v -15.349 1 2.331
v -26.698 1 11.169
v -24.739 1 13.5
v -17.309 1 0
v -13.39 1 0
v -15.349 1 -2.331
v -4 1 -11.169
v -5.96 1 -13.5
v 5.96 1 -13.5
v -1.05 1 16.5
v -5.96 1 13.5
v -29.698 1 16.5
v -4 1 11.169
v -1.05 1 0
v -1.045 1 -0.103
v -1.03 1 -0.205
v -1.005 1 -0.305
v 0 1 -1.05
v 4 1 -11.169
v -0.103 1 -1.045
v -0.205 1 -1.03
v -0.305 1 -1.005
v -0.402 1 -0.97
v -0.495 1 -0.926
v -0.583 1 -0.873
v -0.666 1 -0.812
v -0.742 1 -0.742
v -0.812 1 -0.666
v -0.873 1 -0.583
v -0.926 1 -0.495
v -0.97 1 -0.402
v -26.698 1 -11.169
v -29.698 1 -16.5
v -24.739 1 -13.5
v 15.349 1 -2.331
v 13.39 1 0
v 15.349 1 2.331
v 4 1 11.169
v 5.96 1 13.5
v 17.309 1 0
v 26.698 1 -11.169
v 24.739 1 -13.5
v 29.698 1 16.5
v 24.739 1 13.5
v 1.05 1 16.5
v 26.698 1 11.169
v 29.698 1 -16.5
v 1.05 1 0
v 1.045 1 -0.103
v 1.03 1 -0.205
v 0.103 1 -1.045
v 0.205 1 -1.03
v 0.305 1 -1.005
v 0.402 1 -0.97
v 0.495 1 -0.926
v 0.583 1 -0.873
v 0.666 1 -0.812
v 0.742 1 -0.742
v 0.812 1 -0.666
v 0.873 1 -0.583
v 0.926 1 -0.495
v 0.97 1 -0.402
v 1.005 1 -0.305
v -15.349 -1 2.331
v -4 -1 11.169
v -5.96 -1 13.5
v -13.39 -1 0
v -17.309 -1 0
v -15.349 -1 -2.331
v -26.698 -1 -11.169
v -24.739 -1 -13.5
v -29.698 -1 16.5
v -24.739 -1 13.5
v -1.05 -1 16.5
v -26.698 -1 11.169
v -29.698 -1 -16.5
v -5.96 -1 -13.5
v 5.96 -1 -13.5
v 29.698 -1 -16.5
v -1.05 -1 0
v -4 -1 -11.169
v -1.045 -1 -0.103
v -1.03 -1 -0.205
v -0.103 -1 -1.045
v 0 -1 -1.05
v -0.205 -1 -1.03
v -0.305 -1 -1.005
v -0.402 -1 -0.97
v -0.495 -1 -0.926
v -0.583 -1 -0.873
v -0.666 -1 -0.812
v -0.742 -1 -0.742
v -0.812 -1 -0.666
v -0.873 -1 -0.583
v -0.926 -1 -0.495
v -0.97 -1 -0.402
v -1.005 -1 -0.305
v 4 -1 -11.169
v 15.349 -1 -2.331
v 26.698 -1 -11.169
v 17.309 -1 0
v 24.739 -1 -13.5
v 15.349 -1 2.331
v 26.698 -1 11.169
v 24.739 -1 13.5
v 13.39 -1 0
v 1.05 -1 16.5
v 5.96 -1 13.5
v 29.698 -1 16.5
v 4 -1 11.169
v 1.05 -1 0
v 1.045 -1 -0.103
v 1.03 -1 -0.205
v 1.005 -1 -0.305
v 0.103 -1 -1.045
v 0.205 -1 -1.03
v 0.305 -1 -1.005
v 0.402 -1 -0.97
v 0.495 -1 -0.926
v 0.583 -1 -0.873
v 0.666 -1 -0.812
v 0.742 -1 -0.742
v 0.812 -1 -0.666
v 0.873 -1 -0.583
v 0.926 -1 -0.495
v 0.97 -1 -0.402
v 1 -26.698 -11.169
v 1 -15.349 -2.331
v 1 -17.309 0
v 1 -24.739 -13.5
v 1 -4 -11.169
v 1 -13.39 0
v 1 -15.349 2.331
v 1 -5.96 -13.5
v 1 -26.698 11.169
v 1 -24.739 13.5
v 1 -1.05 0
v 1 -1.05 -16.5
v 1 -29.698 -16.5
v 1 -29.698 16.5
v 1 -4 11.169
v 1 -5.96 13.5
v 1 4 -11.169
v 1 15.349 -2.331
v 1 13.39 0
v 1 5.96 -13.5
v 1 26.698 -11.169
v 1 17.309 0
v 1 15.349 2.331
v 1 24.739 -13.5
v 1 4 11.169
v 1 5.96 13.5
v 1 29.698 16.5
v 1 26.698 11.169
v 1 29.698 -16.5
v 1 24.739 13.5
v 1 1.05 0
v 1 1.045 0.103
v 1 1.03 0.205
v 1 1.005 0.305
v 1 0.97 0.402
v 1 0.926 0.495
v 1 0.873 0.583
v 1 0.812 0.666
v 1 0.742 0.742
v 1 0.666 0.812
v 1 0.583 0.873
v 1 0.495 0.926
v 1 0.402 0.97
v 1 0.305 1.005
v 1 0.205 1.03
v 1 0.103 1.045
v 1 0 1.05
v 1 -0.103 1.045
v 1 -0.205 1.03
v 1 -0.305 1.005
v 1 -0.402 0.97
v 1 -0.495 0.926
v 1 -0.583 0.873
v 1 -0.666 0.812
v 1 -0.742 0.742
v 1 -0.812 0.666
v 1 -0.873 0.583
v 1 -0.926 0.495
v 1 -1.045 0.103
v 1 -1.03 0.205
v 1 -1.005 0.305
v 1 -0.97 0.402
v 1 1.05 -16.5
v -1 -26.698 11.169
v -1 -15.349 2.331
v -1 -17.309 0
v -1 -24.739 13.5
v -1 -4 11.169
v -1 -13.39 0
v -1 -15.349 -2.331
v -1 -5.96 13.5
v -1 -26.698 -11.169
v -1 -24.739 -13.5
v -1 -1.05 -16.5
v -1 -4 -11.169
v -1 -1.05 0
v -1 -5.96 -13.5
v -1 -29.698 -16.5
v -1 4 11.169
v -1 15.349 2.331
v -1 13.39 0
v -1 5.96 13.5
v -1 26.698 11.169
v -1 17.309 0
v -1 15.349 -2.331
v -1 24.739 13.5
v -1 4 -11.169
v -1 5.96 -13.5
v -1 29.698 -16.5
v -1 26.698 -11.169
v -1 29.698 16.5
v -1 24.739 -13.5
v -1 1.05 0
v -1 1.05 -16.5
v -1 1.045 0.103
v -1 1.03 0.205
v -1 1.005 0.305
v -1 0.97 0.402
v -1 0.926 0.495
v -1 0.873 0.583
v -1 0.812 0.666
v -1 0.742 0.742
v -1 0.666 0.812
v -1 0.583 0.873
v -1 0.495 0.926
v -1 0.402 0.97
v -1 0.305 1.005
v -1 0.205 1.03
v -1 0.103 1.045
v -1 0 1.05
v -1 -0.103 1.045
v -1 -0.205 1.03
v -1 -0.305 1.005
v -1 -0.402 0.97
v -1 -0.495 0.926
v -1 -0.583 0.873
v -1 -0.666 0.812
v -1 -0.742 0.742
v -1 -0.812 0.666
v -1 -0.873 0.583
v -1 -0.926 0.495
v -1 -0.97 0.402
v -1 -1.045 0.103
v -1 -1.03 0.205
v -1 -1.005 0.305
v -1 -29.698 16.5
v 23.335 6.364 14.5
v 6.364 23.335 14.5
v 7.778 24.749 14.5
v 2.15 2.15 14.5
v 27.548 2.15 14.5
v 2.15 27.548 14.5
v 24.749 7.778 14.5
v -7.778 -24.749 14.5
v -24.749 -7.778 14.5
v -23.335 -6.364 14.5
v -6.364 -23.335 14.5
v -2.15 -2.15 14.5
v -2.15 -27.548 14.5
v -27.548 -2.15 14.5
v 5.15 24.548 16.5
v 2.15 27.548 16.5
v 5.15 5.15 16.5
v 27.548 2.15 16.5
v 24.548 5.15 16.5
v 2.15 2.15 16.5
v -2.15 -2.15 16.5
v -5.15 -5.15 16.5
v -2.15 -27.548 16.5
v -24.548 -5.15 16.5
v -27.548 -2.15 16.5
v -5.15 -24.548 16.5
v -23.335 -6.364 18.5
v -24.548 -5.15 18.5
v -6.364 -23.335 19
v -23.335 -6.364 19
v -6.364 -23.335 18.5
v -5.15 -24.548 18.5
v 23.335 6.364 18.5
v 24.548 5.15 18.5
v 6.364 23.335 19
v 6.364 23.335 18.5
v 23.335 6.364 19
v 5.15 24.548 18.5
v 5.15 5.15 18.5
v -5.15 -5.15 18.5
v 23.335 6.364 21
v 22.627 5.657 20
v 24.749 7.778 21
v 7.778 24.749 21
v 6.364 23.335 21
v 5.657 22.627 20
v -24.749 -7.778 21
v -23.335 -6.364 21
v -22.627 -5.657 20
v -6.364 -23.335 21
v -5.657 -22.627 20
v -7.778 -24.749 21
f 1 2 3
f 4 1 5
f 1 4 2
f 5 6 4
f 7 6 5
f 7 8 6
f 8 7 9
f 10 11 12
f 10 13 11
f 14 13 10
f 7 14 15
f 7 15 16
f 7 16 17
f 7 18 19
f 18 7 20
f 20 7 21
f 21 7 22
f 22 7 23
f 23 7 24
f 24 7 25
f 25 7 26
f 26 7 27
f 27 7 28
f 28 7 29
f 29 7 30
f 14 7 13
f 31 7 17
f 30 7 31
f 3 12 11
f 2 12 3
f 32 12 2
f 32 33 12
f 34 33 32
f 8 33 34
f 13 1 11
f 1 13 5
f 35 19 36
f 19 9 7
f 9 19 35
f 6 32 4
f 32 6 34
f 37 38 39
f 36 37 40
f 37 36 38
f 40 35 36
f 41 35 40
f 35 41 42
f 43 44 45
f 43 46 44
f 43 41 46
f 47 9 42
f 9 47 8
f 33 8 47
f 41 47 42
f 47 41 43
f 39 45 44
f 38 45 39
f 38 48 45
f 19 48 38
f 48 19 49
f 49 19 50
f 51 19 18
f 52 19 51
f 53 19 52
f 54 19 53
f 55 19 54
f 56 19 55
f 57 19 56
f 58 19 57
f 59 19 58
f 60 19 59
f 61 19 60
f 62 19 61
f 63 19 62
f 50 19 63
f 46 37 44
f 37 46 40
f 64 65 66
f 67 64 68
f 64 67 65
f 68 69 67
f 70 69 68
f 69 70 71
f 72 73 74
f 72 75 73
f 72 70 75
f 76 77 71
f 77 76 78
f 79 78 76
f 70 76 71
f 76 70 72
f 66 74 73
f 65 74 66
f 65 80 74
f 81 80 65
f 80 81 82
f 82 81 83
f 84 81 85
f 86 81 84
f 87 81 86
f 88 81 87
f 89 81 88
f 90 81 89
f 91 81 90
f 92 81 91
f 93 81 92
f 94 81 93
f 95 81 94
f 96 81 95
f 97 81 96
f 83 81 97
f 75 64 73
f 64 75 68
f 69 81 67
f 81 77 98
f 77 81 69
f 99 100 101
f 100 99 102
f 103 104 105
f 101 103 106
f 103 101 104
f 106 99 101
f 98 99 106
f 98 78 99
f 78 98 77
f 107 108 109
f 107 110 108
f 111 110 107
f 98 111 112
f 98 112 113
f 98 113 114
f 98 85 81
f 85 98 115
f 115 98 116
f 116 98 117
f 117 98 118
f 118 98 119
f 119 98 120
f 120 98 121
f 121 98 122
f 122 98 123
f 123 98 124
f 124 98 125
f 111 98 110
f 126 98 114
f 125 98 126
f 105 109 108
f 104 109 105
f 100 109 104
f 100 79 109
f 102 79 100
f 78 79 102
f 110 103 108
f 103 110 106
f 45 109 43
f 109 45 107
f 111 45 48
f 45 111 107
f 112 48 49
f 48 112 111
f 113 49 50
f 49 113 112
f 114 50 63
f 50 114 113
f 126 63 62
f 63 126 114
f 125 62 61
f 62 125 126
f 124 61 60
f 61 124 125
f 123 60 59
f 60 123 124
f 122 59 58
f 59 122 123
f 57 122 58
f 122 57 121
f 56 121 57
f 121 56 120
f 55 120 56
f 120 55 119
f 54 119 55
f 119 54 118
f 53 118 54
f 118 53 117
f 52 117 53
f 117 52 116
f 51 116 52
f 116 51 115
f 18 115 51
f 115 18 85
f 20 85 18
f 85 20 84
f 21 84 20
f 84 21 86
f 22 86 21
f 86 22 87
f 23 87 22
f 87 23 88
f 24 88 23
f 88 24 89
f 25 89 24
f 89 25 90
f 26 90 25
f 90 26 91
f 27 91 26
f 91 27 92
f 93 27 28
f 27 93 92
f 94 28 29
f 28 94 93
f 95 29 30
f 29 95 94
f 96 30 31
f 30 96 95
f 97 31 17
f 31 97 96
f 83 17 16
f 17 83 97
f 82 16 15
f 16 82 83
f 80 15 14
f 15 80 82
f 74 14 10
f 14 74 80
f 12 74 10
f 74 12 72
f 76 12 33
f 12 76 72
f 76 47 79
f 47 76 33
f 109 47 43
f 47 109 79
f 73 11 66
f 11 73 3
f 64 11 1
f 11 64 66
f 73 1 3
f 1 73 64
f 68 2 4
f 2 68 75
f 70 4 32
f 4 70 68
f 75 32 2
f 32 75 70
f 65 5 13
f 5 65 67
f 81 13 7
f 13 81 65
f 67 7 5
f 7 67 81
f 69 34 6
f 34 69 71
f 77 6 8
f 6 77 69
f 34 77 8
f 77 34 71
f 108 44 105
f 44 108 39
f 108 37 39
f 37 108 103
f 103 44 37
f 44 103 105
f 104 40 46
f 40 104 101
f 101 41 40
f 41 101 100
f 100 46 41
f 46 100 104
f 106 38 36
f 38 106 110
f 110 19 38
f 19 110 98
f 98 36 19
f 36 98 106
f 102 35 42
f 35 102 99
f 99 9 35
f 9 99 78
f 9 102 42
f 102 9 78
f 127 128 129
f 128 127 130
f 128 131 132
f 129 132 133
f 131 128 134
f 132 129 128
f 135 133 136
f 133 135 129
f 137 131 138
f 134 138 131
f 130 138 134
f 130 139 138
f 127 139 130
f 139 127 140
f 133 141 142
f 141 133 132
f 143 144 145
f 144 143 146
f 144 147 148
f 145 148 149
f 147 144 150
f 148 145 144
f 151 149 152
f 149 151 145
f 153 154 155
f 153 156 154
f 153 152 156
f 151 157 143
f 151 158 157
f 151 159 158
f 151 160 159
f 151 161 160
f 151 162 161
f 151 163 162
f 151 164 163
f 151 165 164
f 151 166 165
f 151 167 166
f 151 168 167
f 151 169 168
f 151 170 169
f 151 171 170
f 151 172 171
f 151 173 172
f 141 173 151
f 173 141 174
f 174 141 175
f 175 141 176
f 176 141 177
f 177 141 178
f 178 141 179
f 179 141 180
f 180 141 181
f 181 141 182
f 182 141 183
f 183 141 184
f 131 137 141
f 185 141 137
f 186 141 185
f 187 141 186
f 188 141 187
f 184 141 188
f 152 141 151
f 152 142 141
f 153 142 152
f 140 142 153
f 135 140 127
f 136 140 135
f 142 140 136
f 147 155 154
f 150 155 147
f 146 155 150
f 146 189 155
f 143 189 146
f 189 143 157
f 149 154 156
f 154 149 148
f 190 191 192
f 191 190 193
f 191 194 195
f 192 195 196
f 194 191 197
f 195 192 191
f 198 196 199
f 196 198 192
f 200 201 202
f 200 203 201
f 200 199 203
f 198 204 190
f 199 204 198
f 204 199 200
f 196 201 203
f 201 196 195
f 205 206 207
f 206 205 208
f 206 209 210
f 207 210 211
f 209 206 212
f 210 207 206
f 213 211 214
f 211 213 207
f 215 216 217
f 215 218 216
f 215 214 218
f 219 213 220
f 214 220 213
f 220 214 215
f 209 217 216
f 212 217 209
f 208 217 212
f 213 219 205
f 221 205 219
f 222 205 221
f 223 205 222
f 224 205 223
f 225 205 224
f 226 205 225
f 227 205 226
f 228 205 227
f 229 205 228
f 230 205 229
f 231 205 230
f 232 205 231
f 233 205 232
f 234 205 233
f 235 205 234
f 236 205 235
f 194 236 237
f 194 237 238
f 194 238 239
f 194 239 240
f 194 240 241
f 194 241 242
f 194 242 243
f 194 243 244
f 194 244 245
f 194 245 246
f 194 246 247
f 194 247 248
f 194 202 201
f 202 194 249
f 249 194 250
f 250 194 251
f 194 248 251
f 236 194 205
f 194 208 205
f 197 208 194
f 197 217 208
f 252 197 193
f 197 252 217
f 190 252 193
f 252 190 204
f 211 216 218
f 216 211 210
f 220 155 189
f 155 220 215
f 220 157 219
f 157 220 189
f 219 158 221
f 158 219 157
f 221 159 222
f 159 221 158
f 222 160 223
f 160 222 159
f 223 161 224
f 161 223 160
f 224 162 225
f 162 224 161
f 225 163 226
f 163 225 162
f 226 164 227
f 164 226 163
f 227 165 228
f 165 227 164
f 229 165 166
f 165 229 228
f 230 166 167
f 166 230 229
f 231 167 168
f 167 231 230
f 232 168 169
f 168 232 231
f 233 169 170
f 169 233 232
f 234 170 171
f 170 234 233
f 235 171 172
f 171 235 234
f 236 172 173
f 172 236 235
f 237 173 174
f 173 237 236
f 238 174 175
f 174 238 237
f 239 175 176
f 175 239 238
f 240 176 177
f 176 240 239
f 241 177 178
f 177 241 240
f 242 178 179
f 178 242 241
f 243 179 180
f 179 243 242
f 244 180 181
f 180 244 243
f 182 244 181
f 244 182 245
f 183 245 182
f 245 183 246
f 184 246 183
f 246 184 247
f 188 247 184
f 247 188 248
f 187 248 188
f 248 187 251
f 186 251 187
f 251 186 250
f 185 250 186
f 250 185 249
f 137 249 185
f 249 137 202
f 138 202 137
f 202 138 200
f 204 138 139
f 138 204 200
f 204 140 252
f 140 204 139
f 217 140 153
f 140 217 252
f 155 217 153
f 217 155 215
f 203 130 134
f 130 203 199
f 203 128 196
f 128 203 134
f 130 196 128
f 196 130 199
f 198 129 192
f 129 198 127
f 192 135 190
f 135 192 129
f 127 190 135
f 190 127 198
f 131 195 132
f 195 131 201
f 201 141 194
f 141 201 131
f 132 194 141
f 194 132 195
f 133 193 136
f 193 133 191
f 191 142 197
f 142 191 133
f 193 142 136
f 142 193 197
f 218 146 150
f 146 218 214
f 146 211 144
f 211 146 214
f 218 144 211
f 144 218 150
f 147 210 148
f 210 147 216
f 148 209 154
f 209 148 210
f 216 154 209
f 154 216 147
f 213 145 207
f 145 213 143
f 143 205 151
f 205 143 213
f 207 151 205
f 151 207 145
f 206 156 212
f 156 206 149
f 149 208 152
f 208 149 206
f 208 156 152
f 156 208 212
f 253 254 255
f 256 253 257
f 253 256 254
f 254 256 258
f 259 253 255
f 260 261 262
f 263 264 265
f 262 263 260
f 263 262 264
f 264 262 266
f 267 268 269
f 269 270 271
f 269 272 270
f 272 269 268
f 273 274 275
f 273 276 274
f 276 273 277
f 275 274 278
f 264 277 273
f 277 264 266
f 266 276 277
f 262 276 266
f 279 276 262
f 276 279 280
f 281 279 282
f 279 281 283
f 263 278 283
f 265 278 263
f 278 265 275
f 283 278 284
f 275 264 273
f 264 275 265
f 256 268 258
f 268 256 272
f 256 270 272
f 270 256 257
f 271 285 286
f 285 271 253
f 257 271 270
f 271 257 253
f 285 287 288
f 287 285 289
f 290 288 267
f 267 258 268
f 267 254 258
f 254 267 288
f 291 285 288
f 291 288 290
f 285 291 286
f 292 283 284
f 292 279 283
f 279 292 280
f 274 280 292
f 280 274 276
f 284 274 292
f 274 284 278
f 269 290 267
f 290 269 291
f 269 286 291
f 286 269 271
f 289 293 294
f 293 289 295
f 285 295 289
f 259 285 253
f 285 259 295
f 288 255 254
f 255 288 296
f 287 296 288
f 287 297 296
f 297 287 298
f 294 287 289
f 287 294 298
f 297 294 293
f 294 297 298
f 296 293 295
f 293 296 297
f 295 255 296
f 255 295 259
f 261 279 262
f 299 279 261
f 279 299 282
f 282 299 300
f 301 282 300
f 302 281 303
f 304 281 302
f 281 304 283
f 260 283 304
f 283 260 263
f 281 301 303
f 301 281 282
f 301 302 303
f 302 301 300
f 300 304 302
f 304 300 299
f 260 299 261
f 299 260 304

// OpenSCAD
$fn = $preview? 16: 64;

stage_height = 35;
stage_width = 42;
stage_length = stage_width;
stage_thickness = 2;
stage_leg_socket_height = 5;
stage_leg_socket_thickness = 1;
stage_flange_height = 2;
leg_height = stage_height - stage_thickness;
leg_width = sqrt(stage_width ^ 2 + stage_length ^ 2);
leg_thickness = 2;
leg_frame_width = 3;
leg_brace_width = 3;
center_hole_length = 2;
rail_fence_height = 2;
rail_fence_radius = 1;

module leg() {
  module half() {
    hole_width = (leg_width - leg_thickness) / 2 - 2 * leg_frame_width;
    hole_height = leg_height - 2 * leg_frame_width;
    hole_center = [- leg_thickness / 2 - leg_frame_width - hole_width / 2, 0];
    module brace() {
      brace_length = sqrt(hole_width ^ 2 + hole_height ^ 2);
      square([leg_brace_width, brace_length], center = true);
    }
    linear_extrude(leg_thickness) {
      difference() {
        square([leg_width, leg_height], center = true);
        translate([0, leg_height / 4]) square([leg_thickness + 0.1, leg_height / 2], center = true);
        circle(d = leg_thickness + 0.1);
        translate(hole_center) square([hole_width, leg_height - 2 * leg_frame_width], center = true);
      }
      translate(hole_center) rotate(atan2(hole_width, hole_height)) brace();
      translate(hole_center) rotate(atan2(- hole_width, hole_height)) brace();
    }
  }
  intersection() { half(); mirror([1, 0, 0]) half(); }
}

module lower_stage() {
  linear_extrude(stage_thickness)
    intersection() { square([stage_width, stage_length], center = true);
      union() {
        rotate([0, 0, 45]) square([leg_width, 10], center = true);
        rotate([0, 0, 135]) square([leg_width, 10], center = true);
      }
    }
  module leg_socket() {
    linear_extrude(stage_leg_socket_height)
      intersection() {
        difference() {
          union() {
            rotate([0, 0, 45]) square([leg_width, leg_thickness + 2 * stage_leg_socket_thickness], center = true);
            rotate([0, 0, 135]) square([leg_width, leg_thickness + 2 * stage_leg_socket_thickness], center = true);
          }
          rotate([0, 0, 45]) square([leg_width, leg_thickness + 0.5], center = true);
          rotate([0, 0, 135]) square([leg_width, leg_thickness + 0.5], center = true);
        }
        square([stage_width, stage_length], center = true);
      }
  }
  translate([0, 0, stage_thickness]) leg_socket();
}

module upper_stage() {
  allowance = 0.3;
  linear_extrude(stage_flange_height)
    difference() {
      square([stage_width, stage_length], center = true);
      rotate([0, 0, 45]) square([leg_width, leg_thickness + 2 * stage_leg_socket_thickness + allowance], center = true);
      rotate([0, 0, 135]) square([leg_width, leg_thickness + 2 * stage_leg_socket_thickness + allowance], center = true);
      rotate([0, 0, 45]) square([stage_width, stage_length]);
      rotate([0, 0, 225]) square([stage_width, stage_length]);
    }
  translate([0, 0, stage_flange_height])
    linear_extrude(stage_thickness)
      difference() {
        square([stage_width, stage_length], center = true);
        rotate([0, 0, 45]) square([leg_width, 10 + allowance], center = true);
        rotate([0, 0, 135]) square([leg_width, 10 + allowance], center = true);
        rotate([0, 0, 45]) square([stage_width, stage_length]);
        rotate([0, 0, 225]) square([stage_width, stage_length]);
      }
  module rail_pin() {
    linear_extrude(rail_pin_height)
      difference() {
        circle(r = rail_pin_hole_radius + rail_pin_thickness);
        circle(r = rail_pin_hole_radius);
        square([0.5, 2 * (rail_pin_hole_radius + rail_pin_thickness)], center = true);
      }
  }
  module rail_fence() {
    // translate([0, - rail_fence_radius, 0]) cube([rail_fence_radius, 2 * rail_fence_radius, stage_thickness + stage_flange_height]);
    // cylinder(r = rail_fence_radius, h = stage_thickness + stage_flange_height + rail_fence_height);
    rotate([90, 0, 0]) linear_extrude(24, center = true) {
      translate([0, stage_thickness + stage_flange_height]) polygon([[0, 0], [2, 0], [2, 0.5] ,[3, 1.5], [2, 2.5], [0, 2.5]]);
      square([2, stage_thickness + stage_flange_height]);
    }
  }
  translate([stage_width / 2 + 2, 0]) rotate([0, 0, 180]) rail_fence();
  translate([- stage_width / 2 - 2, 0]) rail_fence();
}

module all() {
  color("khaki") rotate([90, 0, 0]) translate([0, 0, - leg_thickness / 2]) leg();
  color("gold") rotate([0, 270, 0]) rotate([0, 0, 90]) translate([0, 0, - leg_thickness / 2]) leg();
  color("olive") % translate([0, 0, leg_height / 2 + stage_thickness]) rotate([180, 0, 45]) lower_stage();
  color("yellow") translate([0, 0, leg_height / 2 - stage_thickness]) rotate([0, 0, 45]) upper_stage();
}

all();
